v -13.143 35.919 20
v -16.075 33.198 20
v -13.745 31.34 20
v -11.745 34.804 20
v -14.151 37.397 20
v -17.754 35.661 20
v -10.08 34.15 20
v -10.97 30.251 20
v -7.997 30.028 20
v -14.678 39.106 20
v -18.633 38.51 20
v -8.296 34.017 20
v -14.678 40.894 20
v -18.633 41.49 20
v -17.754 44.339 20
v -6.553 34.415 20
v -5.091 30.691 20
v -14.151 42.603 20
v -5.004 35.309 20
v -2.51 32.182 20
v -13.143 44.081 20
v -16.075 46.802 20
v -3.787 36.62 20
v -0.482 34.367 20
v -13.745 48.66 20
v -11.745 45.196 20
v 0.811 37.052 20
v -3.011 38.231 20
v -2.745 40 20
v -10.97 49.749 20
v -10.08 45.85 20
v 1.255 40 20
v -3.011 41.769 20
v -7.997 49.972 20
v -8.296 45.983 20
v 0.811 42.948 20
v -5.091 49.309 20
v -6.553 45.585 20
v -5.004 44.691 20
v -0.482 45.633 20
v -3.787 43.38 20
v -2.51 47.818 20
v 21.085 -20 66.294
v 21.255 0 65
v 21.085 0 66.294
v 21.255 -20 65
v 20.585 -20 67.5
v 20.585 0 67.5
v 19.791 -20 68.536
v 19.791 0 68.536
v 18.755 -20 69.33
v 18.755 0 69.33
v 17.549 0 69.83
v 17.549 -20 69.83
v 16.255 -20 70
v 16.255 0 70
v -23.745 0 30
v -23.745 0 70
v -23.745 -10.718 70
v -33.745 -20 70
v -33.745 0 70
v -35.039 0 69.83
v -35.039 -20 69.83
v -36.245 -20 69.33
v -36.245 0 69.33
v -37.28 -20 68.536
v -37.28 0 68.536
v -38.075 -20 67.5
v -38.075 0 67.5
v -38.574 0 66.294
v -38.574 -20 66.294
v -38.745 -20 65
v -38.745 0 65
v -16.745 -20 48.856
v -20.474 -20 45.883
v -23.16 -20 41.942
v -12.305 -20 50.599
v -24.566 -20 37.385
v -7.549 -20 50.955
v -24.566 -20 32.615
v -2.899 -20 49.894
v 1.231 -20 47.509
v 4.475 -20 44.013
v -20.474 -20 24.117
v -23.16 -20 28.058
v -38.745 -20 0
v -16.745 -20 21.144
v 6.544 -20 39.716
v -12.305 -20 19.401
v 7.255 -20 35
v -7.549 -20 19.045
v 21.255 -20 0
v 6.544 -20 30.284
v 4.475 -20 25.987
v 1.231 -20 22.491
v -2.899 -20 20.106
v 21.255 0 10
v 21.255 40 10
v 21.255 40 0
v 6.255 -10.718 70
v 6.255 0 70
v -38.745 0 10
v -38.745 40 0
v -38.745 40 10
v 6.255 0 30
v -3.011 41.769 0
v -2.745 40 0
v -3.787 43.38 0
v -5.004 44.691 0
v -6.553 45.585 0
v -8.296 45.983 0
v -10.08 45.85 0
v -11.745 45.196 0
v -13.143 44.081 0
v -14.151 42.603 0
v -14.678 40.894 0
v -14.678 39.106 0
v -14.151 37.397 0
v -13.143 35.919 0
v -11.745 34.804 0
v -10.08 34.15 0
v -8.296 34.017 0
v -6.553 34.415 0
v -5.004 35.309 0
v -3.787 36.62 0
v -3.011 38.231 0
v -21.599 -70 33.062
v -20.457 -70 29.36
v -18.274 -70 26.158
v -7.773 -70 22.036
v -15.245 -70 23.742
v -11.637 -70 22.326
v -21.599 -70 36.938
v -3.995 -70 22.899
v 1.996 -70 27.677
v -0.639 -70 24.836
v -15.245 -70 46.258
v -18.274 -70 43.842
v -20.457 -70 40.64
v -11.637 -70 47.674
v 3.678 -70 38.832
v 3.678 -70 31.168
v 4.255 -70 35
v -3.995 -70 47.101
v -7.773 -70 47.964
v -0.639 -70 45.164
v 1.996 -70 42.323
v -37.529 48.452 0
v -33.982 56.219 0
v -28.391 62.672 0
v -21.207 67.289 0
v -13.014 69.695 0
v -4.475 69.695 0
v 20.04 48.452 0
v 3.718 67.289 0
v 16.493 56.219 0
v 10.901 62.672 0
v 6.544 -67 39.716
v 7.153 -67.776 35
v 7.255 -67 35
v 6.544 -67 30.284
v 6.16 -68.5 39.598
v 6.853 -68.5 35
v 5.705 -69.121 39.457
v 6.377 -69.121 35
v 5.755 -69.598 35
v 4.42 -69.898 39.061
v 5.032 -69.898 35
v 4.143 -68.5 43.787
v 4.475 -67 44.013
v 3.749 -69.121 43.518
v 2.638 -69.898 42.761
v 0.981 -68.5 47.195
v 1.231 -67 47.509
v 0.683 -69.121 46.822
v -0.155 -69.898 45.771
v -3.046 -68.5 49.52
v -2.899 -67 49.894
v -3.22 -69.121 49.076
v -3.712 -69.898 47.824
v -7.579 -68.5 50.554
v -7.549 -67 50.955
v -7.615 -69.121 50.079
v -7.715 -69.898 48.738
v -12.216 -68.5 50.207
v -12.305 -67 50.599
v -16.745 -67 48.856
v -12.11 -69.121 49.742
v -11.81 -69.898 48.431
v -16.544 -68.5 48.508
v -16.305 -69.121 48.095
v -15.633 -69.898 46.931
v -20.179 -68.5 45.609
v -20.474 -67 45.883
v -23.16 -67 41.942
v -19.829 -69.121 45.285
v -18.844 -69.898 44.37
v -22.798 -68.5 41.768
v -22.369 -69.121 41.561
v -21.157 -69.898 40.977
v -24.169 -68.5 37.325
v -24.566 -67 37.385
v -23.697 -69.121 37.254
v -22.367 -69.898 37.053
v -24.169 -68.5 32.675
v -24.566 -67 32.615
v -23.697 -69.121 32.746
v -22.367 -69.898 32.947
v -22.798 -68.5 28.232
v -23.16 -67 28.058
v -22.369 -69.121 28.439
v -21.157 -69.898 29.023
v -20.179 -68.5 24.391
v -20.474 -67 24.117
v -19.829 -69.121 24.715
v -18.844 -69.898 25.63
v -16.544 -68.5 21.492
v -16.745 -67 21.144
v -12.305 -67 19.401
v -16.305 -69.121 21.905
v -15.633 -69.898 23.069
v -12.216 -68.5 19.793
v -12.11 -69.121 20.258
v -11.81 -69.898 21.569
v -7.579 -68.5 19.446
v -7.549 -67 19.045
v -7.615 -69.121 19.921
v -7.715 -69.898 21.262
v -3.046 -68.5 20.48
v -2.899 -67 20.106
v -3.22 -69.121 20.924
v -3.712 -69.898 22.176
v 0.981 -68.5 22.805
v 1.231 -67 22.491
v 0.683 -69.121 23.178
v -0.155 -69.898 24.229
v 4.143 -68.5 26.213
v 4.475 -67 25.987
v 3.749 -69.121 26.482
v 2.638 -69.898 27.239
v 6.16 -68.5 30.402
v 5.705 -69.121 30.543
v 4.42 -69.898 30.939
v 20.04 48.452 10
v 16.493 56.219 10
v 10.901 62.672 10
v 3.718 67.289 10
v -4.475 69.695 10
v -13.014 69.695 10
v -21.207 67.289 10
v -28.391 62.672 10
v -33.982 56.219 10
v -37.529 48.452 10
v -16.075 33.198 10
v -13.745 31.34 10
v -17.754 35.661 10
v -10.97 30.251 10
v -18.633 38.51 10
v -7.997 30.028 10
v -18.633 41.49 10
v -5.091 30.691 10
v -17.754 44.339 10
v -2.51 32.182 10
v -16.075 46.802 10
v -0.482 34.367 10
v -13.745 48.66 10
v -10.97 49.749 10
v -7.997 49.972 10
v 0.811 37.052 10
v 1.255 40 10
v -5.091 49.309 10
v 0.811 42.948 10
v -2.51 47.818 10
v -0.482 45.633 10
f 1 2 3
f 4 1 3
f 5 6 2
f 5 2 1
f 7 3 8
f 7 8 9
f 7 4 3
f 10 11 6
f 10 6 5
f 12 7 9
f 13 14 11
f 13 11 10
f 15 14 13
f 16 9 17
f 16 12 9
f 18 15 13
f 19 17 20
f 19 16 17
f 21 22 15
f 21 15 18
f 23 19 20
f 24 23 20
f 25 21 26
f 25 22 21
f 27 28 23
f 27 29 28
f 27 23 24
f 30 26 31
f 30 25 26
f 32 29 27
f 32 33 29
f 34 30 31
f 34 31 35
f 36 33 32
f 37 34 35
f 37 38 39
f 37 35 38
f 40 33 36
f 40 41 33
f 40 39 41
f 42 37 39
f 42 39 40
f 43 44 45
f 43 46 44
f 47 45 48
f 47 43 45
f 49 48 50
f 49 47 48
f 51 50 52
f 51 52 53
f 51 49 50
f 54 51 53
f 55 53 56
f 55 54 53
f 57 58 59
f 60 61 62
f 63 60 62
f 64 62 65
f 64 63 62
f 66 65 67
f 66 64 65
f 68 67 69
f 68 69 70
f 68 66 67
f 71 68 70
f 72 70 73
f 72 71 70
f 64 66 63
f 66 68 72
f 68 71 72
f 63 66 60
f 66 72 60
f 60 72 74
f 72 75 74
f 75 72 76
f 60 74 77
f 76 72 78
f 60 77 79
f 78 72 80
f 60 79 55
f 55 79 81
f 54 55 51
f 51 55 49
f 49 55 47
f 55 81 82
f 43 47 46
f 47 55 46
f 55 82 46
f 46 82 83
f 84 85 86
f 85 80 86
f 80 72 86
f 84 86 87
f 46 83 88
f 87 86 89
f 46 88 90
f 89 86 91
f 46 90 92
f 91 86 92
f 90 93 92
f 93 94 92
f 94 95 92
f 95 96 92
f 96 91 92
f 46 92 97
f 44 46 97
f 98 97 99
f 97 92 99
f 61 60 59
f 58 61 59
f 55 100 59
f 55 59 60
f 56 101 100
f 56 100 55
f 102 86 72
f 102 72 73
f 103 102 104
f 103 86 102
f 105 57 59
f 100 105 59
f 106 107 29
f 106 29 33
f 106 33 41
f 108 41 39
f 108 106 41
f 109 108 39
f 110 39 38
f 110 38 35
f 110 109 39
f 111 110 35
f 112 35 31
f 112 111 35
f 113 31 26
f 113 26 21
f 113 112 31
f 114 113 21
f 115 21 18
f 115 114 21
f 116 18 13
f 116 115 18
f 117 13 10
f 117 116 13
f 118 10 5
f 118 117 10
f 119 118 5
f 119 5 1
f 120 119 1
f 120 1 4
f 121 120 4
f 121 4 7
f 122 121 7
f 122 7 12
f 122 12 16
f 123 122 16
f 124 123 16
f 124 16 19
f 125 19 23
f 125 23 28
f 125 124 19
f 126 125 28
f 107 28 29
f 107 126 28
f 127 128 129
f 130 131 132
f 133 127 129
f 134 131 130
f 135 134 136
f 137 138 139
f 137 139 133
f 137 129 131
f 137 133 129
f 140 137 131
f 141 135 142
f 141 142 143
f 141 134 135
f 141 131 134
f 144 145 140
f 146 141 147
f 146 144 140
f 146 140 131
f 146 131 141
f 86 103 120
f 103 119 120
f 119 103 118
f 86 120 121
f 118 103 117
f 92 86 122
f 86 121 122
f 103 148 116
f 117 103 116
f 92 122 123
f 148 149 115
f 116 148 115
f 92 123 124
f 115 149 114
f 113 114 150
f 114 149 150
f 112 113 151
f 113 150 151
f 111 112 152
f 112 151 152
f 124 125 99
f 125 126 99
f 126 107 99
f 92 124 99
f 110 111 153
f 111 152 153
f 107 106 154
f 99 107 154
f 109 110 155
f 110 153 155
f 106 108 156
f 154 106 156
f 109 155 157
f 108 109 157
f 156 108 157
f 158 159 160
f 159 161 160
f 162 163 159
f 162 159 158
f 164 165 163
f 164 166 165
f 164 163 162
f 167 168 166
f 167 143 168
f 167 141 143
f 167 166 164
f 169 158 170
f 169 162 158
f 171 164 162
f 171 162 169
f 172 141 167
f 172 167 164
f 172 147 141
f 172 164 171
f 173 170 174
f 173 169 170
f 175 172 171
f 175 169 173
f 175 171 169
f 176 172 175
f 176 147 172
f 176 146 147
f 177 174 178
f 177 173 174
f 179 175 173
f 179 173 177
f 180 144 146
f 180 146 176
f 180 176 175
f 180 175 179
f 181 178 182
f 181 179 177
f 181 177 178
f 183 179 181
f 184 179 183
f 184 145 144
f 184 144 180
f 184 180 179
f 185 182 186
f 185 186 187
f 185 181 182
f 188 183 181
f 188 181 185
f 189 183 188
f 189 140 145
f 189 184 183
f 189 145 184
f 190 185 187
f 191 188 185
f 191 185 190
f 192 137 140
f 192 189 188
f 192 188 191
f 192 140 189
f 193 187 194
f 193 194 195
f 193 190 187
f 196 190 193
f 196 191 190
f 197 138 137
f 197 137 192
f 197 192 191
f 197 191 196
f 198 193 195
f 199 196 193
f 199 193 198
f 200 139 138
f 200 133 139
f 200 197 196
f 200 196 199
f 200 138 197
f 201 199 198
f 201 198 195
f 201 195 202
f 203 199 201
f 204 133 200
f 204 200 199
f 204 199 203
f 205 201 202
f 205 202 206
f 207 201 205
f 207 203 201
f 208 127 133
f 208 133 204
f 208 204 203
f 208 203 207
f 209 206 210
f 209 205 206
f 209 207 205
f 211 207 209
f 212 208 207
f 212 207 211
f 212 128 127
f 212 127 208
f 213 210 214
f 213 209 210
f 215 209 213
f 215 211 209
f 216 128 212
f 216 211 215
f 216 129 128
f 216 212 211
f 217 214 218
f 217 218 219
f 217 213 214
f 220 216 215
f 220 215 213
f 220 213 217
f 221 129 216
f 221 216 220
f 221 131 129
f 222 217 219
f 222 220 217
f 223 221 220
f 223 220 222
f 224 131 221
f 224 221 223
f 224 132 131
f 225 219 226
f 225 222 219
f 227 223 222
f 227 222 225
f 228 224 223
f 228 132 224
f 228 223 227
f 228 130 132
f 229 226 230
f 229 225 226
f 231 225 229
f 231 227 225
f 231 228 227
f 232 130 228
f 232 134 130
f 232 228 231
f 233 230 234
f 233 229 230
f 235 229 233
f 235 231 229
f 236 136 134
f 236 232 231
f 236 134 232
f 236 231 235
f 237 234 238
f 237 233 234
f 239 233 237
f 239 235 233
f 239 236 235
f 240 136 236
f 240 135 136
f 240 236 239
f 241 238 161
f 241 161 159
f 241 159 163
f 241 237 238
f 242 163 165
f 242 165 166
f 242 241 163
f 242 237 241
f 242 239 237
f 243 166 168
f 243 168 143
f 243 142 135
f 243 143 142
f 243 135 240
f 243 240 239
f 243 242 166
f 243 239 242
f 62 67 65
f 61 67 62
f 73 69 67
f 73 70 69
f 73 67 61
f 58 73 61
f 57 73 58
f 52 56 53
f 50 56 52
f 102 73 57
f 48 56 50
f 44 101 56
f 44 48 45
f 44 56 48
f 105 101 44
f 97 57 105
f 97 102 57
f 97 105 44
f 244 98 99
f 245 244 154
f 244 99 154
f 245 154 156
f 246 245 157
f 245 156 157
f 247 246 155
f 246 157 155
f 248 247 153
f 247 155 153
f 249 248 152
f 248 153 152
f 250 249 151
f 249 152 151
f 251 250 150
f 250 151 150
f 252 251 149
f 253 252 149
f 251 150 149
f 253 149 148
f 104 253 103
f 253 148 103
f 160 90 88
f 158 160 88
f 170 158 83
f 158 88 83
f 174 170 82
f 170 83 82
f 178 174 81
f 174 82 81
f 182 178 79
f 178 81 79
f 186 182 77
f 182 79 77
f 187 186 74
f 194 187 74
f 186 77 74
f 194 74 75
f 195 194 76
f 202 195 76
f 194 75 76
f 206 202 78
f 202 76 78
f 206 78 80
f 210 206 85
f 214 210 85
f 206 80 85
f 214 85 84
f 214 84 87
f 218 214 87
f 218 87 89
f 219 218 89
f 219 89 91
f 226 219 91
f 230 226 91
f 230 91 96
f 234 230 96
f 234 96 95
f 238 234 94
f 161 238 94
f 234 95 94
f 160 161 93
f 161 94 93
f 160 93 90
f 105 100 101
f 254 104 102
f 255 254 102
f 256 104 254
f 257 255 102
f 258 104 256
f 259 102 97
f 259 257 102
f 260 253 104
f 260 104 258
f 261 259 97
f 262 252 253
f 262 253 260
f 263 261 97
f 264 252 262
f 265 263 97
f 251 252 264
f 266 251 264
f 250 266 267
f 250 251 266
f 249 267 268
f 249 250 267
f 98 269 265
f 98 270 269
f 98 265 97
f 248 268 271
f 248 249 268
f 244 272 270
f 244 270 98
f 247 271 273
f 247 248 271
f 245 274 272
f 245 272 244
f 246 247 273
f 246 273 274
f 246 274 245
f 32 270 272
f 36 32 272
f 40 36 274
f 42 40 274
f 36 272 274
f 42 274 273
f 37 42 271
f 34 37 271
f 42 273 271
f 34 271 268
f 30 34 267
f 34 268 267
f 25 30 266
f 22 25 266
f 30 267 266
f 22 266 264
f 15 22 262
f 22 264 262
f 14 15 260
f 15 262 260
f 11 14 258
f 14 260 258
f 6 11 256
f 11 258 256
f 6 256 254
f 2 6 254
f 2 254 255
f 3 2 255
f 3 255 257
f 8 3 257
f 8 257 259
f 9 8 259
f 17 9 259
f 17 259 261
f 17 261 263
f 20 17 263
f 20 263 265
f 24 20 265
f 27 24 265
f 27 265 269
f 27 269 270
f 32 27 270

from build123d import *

# Parameters (mm, degrees)
F0_R      = 10
F1_DEPTH  = 10
F0_R_2    = 6
F2_DEPTH  = 20
F0_W      = 60
F0_H      = 20
F3_DEPTH  = 70
F4_R      = 16
F5_DEPTH  = 50
F6_R      = 3
F9_DEPTH  = 65.4
F10_DEPTH = 15
F11_DEPTH = 15
F12_R     = 5
F13_R     = 5


with BuildPart() as f1:
    # F0 (on Top) → F1 (new body)
    with BuildSketch(Plane.XY):
        with BuildLine():
            Line((-38.7446990098, 40), (-38.7446990098, 0))
            Line((-38.7446990098, 0), (21.2553009902, 0))
            Line((21.2553009902, 0), (21.2553009902, 40))
            ThreePointArc((21.2553009902, 40), (12.4685044258, 61.2132034356), (-8.7446990098, 70))
            ThreePointArc((-8.7446990098, 70), (-29.9579024454, 61.2132034356), (-38.7446990098, 40))
        make_face()
        with Locations((-8.7446990098, 40)):
            Circle(F0_R, mode=Mode.SUBTRACT)
    extrude(amount=F1_DEPTH)

    # F0 (on Top) → F2 (join)
    with BuildSketch(Plane.XY):
        with Locations((-8.7446990098, 40)):
            Circle(F0_R)
        with Locations((-8.7446990098, 40)):
            Circle(F0_R_2, mode=Mode.SUBTRACT)
    extrude(amount=F2_DEPTH)

    # F0 (on Top) → F3 (join)
    with BuildSketch(Plane.XY):
        with Locations((-8.7446990098, -10)):
            Rectangle(F0_W, F0_H)
    extrude(amount=F3_DEPTH)

    # F4 (on face) → F5 (join)
    with BuildSketch(Plane.XZ.offset(20)):
        with Locations((-8.7446990098, 35)):
            Circle(F4_R)
    extrude(amount=F5_DEPTH)

    # F6
    f6_edges = [f1.edges().sort_by_distance(p)[0] for p in [
        (-24.744699, -70, 35),
    ]]
    fillet(f6_edges, radius=F6_R)

    # F8 (on face) → F9 (cut)
    with BuildSketch(Plane(origin=(-38.7446990098, 0, 0), x_dir=(0, -1, 0), z_dir=(-1, 0, 0))):
        Polygon((10.7179676972, 70), (0, 70), (0, 30), align=None)
    extrude(amount=-F9_DEPTH, mode=Mode.SUBTRACT)

    # F8 (on face) → F10 (join)
    with BuildSketch(Plane(origin=(-38.7446990098, 0, 0), x_dir=(0, -1, 0), z_dir=(-1, 0, 0))):
        Polygon((10.7179676972, 70), (0, 30), (0, 10), (-40, 10), (-40, 0), (20, 0), (20, 70), align=None)
        Polygon((10.7179676972, 70), (0, 70), (0, 30), align=None)
    extrude(amount=-F10_DEPTH)

    # F7 (on face) → F11 (join)
    with BuildSketch(Plane.YZ.offset(21.2553009902)):
        Polygon((0, 10), (0, 30), (-10.7179676972, 70), (-20, 70), (-20, 0), (40, 0), (40, 10), align=None)
        Polygon((0, 30), (0, 70), (-10.7179676972, 70), align=None)
    extrude(amount=-F11_DEPTH)

    # F12
    f12_edges = [f1.edges().sort_by_distance(p)[0] for p in [
        (21.255301, -10, 70),
    ]]
    fillet(f12_edges, radius=F12_R)

    # F13
    f13_edges = [f1.edges().sort_by_distance(p)[0] for p in [
        (-38.744699, -10, 70),
    ]]
    fillet(f13_edges, radius=F13_R)


solid = f1.part
